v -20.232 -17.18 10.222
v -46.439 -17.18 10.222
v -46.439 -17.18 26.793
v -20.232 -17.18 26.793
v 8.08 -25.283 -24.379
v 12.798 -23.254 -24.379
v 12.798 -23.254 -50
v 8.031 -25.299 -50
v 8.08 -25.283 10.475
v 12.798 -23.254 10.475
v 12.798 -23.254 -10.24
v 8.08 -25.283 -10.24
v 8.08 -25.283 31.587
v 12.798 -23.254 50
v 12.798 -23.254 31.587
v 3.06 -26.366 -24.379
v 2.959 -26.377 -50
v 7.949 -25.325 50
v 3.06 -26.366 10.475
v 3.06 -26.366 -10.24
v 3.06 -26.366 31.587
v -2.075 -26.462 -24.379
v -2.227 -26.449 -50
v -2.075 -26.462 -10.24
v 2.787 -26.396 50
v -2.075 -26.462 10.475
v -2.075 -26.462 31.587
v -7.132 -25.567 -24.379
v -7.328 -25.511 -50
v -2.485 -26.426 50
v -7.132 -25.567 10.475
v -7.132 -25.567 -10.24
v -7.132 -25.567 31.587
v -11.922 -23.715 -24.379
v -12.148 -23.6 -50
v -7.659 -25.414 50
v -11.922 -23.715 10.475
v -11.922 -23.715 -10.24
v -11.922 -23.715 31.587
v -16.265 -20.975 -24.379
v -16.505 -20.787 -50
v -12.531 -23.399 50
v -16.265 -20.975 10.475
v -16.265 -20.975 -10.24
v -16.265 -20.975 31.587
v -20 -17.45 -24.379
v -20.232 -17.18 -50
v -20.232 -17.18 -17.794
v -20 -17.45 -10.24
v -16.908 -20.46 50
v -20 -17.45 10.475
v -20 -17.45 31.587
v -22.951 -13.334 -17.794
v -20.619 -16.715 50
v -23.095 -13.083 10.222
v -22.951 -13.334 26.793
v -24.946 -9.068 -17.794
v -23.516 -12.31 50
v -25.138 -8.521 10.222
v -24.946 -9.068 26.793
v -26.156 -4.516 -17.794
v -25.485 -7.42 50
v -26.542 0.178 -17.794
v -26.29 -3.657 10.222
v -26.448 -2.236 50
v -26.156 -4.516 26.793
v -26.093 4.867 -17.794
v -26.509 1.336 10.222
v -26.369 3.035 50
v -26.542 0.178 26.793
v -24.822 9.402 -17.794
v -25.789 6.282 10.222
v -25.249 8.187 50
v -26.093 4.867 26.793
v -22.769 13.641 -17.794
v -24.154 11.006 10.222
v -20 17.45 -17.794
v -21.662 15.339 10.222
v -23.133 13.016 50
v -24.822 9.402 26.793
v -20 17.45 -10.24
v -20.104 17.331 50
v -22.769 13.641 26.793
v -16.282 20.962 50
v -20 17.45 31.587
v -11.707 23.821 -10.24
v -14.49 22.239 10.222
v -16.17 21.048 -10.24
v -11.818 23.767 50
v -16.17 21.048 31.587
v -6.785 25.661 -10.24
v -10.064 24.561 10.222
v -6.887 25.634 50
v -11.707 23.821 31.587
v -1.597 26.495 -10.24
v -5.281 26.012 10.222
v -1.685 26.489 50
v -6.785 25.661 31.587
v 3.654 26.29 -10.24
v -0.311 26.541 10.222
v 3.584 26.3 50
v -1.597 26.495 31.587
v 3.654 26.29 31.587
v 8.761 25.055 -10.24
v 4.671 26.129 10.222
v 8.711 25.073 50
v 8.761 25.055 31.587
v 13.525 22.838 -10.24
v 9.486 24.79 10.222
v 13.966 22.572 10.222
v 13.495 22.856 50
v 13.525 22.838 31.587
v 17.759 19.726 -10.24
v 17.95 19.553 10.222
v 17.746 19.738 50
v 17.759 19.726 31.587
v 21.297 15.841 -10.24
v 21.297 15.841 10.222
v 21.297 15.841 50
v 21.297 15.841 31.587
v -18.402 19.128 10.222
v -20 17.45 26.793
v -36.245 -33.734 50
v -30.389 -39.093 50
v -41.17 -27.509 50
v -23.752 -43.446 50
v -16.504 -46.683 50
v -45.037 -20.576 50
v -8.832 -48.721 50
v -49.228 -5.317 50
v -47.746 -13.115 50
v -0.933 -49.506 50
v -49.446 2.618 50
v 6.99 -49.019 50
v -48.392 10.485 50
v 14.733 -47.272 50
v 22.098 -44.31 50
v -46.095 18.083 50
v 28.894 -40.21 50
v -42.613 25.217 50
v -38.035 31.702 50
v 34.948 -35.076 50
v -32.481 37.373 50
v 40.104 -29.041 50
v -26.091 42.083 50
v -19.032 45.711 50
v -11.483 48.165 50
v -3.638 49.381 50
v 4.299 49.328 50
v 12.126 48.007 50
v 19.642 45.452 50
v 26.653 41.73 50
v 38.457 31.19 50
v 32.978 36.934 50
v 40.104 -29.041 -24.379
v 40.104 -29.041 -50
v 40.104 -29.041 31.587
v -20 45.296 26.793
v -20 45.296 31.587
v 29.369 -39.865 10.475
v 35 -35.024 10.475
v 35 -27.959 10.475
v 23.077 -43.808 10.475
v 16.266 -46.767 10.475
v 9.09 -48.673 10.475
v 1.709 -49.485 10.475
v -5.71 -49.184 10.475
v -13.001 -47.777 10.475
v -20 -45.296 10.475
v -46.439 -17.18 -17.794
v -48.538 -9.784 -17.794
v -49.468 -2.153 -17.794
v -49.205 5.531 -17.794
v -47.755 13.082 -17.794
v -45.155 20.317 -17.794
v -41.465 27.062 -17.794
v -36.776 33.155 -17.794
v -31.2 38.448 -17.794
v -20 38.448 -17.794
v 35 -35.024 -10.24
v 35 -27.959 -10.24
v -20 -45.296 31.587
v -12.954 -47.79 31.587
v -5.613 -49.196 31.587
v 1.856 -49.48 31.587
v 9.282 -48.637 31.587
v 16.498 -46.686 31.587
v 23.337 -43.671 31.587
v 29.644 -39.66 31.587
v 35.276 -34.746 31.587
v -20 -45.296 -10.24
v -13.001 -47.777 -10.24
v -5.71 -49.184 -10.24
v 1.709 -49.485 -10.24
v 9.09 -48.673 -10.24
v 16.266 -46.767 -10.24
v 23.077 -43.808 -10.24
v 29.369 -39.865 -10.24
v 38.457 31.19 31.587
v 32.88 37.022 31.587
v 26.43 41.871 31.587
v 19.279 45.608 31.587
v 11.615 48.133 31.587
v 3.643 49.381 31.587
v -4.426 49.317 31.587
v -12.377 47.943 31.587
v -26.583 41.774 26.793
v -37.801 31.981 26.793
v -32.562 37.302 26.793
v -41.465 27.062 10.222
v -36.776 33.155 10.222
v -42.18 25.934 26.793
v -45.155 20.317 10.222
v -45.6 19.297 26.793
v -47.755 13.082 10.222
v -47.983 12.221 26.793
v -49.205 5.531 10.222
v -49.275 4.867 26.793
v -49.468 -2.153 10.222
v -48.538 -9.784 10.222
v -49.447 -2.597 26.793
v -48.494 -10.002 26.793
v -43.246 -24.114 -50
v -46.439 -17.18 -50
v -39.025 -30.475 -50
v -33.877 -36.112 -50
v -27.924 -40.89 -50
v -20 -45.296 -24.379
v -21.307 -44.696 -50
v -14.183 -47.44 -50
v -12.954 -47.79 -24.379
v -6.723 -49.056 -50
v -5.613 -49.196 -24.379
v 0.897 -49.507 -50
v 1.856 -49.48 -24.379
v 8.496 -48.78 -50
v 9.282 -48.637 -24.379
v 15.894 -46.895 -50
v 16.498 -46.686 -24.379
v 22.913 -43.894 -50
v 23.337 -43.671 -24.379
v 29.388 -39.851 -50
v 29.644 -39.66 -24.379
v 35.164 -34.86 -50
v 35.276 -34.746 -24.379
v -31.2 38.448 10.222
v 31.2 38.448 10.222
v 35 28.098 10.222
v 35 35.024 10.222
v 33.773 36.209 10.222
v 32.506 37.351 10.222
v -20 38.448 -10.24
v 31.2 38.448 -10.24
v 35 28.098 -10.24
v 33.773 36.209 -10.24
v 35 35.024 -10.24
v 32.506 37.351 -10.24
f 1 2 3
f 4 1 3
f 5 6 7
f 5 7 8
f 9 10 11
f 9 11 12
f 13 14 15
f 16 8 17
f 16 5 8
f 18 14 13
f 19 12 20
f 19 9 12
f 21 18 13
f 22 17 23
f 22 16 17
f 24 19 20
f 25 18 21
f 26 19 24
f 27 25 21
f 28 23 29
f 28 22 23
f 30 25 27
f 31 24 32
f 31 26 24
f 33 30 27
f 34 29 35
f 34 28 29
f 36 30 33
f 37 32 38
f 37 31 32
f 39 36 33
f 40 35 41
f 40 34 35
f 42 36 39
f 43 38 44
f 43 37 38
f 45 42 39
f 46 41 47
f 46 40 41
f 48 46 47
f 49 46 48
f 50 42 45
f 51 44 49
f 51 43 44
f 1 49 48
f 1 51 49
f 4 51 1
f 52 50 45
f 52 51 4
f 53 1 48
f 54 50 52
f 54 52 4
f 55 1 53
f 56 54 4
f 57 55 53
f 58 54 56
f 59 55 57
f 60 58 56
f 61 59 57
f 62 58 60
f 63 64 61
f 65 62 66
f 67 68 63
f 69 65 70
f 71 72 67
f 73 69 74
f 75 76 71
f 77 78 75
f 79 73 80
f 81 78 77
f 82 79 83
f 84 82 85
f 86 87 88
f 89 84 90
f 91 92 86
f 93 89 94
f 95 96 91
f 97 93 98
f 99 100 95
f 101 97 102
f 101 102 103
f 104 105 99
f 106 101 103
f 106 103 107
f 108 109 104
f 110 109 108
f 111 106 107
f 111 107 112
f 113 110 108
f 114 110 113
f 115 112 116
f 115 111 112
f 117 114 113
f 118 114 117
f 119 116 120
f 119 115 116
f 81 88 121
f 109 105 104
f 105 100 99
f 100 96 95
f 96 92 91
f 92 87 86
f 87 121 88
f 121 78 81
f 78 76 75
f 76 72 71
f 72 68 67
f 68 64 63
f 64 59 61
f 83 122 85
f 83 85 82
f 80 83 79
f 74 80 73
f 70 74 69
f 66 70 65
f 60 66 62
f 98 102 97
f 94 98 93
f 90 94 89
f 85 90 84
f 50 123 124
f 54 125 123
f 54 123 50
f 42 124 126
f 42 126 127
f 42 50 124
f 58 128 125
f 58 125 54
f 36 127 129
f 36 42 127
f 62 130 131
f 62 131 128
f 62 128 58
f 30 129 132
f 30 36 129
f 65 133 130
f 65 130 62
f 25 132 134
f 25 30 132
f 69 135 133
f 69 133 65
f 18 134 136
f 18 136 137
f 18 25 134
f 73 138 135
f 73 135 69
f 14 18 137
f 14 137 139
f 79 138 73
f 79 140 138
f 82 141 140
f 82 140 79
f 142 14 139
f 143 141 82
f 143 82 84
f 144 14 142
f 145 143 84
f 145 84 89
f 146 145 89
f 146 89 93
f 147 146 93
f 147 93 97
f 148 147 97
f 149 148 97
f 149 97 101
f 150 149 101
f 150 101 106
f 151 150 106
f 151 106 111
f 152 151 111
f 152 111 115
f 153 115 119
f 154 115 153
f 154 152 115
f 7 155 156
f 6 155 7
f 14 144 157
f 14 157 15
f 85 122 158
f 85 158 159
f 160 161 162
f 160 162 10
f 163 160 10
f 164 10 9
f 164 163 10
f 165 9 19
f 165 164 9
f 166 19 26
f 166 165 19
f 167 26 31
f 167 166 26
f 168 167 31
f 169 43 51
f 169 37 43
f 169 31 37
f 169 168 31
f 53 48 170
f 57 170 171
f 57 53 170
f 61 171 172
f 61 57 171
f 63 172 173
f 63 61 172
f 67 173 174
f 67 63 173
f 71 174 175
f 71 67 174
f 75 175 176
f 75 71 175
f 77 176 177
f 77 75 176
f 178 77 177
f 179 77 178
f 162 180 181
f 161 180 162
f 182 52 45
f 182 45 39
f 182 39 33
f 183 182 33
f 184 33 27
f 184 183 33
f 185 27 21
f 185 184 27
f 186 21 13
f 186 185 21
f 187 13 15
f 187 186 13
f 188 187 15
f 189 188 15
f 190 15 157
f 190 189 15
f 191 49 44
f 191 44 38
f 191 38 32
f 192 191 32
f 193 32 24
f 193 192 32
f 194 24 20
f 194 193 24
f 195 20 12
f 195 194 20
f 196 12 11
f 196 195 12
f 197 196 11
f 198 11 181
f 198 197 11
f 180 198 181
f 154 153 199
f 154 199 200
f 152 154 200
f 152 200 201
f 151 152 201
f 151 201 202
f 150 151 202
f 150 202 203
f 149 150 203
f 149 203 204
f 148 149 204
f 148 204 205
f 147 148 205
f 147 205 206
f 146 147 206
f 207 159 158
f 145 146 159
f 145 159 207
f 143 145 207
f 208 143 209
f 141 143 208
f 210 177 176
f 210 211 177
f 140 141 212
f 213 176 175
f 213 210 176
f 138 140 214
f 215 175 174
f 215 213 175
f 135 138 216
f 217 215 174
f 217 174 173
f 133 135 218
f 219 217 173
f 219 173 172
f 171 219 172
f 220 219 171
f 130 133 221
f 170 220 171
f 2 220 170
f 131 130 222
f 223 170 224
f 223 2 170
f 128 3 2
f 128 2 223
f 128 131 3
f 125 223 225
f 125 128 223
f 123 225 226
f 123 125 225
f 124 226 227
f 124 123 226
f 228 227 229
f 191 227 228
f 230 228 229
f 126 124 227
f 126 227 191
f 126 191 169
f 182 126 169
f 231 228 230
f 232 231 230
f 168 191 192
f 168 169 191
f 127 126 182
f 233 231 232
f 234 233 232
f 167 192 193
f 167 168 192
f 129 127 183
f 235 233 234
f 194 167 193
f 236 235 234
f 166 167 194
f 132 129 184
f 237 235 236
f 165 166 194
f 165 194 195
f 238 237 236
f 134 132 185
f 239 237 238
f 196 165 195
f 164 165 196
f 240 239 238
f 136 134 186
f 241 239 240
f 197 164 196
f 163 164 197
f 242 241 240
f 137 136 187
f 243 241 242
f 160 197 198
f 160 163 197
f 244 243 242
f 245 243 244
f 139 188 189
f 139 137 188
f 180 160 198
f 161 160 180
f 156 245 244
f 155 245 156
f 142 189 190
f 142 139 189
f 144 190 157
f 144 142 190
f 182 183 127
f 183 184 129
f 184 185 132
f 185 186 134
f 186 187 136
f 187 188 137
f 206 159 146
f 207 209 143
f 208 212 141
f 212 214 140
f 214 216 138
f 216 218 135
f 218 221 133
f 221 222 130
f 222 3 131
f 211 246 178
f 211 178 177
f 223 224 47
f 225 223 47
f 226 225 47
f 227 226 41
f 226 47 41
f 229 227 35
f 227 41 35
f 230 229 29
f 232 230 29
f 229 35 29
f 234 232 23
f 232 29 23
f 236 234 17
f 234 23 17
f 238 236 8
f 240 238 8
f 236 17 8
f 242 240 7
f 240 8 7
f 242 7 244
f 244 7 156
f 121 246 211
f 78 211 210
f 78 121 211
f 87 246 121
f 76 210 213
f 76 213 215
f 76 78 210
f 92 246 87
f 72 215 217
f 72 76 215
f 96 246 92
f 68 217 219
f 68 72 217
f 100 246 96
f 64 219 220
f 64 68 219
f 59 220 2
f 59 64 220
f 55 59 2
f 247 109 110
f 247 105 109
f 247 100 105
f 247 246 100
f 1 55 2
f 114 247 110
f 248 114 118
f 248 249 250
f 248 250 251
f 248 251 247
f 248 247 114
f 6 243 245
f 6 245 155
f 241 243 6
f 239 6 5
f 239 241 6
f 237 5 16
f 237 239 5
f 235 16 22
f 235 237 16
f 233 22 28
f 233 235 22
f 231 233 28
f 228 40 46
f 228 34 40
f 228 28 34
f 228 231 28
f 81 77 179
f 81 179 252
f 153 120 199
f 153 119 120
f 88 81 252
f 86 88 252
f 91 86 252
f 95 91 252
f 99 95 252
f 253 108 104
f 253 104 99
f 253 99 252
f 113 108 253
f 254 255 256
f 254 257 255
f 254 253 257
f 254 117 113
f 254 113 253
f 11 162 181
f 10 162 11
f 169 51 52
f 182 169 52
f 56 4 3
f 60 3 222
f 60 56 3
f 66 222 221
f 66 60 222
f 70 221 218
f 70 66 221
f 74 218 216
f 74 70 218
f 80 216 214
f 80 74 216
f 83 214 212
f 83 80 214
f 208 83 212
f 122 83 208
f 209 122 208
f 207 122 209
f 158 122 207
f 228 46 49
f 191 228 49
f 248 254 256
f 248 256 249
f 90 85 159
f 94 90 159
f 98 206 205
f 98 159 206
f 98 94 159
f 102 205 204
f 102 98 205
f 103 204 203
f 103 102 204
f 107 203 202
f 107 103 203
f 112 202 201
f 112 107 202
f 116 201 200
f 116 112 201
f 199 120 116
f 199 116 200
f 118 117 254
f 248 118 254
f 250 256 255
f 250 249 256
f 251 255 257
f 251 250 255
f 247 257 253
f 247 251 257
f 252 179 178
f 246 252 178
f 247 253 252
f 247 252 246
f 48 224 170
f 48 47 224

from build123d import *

# Parameters (mm, degrees)
F3_DEPTH = 50
F4_DEPTH = 50
F5_DEPTH = 50


with BuildPart() as f3:
    # F0 (on Top) → F3 (new body, symmetric)
    with BuildSketch(Plane.XY):
        with BuildLine():
            Line((21.297112, 15.841494), (38.456534, 31.189908))
            ThreePointArc((38.456534, 31.189908), (-49.496281, -1.35408), (40.104275, -29.040704))
            Line((40.104275, -29.040704), (12.797512, -23.253894))
            ThreePointArc((12.797512, -23.253894), (-25.936908, 5.638858), (21.297112, 15.841494))
        make_face()
    extrude(amount=F3_DEPTH, both=True)

    # F1 (on Front) → F4 (intersect, symmetric)
    with BuildSketch(Plane.XZ):
        Polygon((-20, 50), (-50, 50), (-50, -50), (-20, -50), (50, -50), (50, -24.378916), (-20, -24.378916), (-20, -10.240086), (35, -10.240086), (35, 10.474946), (-20, 10.474946), (-20, 31.586639), (50, 31.586639), (50, 50), align=None)
    extrude(amount=F4_DEPTH, both=True, mode=Mode.INTERSECT)

    # F2 (on Right) → F5 (intersect, symmetric)
    with BuildSketch(Plane.YZ):
        Polygon((49.905006, 26.793262), (49.905006, 50.518591), (-49.905006, 50.518591), (-49.905006, 26.793262), (-49.905006, -50.518591), (-17.180409, -50.518591), (-17.180409, -17.793998), (38.448131, -17.793998), (38.448131, 0), (38.448131, 10.222353), (-17.180409, 10.222353), (-17.180409, 26.793262), align=None)
    extrude(amount=F5_DEPTH, both=True, mode=Mode.INTERSECT)


solid = f3.part
